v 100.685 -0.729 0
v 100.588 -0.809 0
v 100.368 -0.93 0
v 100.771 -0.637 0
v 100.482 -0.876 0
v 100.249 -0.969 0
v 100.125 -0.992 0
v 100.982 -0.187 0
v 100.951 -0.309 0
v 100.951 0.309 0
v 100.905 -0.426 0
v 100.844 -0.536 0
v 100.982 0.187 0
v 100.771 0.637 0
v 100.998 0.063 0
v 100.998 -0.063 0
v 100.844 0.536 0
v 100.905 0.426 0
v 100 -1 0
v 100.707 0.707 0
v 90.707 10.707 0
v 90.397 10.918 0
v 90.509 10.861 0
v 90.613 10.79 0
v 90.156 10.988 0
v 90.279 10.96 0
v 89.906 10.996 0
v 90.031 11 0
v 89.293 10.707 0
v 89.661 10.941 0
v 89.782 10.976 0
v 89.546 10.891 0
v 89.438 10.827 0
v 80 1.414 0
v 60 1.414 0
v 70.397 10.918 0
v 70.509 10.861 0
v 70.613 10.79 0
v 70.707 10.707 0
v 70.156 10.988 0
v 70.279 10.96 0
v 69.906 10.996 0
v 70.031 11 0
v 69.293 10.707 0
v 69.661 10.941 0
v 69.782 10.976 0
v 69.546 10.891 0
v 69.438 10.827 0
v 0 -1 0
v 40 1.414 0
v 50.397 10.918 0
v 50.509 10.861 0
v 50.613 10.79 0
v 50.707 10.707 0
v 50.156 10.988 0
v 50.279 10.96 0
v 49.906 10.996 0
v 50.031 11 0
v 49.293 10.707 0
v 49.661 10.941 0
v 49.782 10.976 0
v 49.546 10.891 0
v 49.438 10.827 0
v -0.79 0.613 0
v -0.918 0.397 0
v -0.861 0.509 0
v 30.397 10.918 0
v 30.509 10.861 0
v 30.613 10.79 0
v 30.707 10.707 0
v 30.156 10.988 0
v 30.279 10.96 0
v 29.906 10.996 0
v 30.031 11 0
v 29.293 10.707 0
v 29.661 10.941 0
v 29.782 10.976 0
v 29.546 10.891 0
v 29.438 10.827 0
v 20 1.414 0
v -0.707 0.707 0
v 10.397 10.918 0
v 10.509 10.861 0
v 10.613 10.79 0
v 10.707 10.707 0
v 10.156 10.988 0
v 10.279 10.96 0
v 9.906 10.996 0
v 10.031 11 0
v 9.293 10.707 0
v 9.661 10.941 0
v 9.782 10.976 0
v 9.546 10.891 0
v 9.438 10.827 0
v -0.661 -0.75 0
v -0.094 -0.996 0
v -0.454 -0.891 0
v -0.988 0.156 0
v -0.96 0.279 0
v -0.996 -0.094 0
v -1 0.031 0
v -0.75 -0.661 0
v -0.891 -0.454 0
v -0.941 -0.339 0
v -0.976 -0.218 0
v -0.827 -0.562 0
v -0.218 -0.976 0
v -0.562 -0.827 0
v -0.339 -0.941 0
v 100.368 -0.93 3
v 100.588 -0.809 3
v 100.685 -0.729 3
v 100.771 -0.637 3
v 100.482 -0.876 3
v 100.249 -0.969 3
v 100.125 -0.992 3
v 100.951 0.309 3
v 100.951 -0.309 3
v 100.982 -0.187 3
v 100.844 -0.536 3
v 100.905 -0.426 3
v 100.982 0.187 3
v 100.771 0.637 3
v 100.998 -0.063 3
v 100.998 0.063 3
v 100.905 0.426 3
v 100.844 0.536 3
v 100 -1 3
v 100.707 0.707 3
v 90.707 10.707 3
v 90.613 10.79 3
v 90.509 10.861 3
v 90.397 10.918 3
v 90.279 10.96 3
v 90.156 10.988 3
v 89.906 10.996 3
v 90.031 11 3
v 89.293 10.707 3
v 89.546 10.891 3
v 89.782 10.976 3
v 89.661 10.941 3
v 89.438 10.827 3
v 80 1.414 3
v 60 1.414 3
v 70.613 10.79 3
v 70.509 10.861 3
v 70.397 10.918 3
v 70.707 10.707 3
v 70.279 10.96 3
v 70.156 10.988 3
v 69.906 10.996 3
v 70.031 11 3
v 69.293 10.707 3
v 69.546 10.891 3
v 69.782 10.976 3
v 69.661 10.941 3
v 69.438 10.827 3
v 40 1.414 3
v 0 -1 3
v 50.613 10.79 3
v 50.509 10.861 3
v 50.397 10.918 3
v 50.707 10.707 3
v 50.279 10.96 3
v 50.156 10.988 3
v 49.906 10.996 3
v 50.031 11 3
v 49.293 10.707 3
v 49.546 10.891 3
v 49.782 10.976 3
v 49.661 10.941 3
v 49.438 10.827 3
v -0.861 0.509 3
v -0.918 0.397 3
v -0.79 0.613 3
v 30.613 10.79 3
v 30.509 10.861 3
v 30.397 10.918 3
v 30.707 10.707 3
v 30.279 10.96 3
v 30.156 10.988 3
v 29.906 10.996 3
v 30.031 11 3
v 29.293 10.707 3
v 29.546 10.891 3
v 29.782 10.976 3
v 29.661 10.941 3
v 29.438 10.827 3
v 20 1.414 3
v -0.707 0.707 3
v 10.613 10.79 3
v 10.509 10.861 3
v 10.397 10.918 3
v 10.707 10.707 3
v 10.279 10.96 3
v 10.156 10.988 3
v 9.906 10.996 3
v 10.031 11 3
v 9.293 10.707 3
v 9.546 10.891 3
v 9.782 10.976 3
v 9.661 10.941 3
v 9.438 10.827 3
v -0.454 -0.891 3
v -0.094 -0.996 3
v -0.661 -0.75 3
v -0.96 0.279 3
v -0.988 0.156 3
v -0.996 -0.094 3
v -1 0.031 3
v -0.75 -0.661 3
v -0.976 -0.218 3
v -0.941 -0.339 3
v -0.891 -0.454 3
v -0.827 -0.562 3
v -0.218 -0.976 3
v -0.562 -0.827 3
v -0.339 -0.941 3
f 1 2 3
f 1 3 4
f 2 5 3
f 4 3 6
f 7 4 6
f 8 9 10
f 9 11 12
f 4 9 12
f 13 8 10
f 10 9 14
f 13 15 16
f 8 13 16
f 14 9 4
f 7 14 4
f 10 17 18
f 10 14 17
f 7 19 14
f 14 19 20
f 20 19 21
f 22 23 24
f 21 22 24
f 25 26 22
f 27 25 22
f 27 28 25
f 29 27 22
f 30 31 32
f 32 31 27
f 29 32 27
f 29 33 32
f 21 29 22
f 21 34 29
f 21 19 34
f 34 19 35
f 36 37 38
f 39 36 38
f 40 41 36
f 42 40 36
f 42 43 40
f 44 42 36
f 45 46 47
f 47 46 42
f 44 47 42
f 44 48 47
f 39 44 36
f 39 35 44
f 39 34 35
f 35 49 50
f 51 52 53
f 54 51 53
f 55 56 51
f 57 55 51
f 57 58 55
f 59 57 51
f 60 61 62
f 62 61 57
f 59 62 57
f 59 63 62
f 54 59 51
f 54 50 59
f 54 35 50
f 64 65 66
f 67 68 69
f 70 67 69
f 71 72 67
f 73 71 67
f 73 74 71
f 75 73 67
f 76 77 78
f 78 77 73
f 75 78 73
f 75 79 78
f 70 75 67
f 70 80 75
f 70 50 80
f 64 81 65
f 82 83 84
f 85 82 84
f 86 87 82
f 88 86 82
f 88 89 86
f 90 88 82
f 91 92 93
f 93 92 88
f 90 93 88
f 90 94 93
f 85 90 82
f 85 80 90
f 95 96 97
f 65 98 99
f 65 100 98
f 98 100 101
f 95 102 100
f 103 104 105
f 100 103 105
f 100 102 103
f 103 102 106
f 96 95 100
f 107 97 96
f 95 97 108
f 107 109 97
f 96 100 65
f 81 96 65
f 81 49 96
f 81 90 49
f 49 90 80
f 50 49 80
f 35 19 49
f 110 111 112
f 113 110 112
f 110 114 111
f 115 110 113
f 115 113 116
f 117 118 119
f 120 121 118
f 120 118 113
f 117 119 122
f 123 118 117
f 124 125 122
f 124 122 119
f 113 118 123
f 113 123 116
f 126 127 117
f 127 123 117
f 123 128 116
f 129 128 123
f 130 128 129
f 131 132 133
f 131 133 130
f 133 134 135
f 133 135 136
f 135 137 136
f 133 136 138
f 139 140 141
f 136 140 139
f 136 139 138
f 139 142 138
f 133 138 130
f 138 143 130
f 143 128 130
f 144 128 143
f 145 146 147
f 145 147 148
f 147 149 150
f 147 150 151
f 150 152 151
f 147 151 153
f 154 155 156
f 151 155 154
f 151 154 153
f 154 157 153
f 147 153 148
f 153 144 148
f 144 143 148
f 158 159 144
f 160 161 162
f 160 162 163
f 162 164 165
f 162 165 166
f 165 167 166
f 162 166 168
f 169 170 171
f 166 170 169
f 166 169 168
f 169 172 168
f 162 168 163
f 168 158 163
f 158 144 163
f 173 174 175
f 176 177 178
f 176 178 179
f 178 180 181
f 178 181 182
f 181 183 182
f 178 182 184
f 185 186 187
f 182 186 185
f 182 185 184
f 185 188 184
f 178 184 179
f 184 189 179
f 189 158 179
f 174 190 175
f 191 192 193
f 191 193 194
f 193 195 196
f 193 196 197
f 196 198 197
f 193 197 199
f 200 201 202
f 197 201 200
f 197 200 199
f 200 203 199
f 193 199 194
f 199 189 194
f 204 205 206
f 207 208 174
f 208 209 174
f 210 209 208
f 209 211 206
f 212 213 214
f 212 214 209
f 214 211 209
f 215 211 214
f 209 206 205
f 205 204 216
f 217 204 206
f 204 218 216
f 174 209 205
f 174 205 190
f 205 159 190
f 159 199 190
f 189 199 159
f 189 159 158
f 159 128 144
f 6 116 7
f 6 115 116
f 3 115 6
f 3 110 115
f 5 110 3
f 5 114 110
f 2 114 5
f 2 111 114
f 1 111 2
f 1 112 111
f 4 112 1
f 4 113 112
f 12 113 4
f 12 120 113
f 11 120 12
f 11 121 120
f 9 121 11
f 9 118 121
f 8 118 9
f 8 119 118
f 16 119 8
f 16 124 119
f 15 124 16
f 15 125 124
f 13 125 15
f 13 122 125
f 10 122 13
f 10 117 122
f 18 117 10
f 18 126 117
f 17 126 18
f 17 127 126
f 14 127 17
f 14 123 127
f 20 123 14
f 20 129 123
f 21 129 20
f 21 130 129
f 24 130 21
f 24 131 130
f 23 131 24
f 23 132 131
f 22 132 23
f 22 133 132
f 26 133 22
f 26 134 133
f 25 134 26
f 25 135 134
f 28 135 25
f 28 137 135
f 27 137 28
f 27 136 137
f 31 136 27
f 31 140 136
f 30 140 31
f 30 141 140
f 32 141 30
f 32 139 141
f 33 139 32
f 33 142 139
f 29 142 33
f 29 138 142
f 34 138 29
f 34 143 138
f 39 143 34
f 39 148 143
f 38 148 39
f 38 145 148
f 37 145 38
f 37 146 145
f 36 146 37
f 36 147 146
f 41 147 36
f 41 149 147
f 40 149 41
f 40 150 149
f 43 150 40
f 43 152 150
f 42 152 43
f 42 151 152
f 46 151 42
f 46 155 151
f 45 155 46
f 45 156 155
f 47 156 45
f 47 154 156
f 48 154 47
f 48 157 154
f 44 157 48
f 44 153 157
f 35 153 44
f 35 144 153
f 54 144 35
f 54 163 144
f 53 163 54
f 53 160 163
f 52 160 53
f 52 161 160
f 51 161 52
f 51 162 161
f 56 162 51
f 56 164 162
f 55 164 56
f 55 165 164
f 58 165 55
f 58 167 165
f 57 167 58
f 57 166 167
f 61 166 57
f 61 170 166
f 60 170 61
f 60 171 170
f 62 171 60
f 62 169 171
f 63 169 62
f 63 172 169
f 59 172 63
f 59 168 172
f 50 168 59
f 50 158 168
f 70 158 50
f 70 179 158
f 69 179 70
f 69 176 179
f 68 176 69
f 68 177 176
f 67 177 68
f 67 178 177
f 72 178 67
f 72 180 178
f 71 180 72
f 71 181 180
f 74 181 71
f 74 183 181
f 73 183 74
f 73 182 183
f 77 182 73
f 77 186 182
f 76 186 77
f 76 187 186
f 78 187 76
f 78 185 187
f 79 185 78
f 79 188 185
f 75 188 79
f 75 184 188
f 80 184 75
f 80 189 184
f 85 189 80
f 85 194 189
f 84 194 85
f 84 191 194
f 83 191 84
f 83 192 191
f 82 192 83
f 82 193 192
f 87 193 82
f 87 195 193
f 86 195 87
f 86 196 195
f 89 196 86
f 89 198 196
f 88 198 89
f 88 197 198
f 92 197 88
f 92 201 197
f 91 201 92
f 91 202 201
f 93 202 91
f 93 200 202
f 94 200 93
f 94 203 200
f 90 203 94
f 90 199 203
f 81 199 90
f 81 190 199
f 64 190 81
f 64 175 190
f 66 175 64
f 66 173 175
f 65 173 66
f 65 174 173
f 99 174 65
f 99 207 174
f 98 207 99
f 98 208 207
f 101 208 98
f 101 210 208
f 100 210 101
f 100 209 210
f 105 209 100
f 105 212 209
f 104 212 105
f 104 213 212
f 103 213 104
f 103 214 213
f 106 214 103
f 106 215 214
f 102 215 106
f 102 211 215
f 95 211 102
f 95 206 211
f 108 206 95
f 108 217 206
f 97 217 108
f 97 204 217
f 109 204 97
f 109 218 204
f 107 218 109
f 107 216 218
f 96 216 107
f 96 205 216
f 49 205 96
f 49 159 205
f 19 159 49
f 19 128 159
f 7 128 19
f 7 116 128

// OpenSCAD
linear_extrude(height = 3.0) {
  offset(r = 1.0) {
    polygon(points = [[0.0, 0.0], [10.000000000000002, 10.0], [20.000000000000004, 0.0], [30.000000000000007, 10.0], [40.00000000000001, 0.0], [50.00000000000001, 10.0], [60.000000000000014, 0.0], [70.00000000000001, 10.0], [80.00000000000001, 0.0], [90.00000000000001, 10.0], [100.00000000000001, 0.0]], paths = [[0.0, 1.0, 2.0, 3.0, 4.0, 5.0, 6.0, 7.0, 8.0, 9.0, 10.0]]);
  }
}
$fn = 50;
